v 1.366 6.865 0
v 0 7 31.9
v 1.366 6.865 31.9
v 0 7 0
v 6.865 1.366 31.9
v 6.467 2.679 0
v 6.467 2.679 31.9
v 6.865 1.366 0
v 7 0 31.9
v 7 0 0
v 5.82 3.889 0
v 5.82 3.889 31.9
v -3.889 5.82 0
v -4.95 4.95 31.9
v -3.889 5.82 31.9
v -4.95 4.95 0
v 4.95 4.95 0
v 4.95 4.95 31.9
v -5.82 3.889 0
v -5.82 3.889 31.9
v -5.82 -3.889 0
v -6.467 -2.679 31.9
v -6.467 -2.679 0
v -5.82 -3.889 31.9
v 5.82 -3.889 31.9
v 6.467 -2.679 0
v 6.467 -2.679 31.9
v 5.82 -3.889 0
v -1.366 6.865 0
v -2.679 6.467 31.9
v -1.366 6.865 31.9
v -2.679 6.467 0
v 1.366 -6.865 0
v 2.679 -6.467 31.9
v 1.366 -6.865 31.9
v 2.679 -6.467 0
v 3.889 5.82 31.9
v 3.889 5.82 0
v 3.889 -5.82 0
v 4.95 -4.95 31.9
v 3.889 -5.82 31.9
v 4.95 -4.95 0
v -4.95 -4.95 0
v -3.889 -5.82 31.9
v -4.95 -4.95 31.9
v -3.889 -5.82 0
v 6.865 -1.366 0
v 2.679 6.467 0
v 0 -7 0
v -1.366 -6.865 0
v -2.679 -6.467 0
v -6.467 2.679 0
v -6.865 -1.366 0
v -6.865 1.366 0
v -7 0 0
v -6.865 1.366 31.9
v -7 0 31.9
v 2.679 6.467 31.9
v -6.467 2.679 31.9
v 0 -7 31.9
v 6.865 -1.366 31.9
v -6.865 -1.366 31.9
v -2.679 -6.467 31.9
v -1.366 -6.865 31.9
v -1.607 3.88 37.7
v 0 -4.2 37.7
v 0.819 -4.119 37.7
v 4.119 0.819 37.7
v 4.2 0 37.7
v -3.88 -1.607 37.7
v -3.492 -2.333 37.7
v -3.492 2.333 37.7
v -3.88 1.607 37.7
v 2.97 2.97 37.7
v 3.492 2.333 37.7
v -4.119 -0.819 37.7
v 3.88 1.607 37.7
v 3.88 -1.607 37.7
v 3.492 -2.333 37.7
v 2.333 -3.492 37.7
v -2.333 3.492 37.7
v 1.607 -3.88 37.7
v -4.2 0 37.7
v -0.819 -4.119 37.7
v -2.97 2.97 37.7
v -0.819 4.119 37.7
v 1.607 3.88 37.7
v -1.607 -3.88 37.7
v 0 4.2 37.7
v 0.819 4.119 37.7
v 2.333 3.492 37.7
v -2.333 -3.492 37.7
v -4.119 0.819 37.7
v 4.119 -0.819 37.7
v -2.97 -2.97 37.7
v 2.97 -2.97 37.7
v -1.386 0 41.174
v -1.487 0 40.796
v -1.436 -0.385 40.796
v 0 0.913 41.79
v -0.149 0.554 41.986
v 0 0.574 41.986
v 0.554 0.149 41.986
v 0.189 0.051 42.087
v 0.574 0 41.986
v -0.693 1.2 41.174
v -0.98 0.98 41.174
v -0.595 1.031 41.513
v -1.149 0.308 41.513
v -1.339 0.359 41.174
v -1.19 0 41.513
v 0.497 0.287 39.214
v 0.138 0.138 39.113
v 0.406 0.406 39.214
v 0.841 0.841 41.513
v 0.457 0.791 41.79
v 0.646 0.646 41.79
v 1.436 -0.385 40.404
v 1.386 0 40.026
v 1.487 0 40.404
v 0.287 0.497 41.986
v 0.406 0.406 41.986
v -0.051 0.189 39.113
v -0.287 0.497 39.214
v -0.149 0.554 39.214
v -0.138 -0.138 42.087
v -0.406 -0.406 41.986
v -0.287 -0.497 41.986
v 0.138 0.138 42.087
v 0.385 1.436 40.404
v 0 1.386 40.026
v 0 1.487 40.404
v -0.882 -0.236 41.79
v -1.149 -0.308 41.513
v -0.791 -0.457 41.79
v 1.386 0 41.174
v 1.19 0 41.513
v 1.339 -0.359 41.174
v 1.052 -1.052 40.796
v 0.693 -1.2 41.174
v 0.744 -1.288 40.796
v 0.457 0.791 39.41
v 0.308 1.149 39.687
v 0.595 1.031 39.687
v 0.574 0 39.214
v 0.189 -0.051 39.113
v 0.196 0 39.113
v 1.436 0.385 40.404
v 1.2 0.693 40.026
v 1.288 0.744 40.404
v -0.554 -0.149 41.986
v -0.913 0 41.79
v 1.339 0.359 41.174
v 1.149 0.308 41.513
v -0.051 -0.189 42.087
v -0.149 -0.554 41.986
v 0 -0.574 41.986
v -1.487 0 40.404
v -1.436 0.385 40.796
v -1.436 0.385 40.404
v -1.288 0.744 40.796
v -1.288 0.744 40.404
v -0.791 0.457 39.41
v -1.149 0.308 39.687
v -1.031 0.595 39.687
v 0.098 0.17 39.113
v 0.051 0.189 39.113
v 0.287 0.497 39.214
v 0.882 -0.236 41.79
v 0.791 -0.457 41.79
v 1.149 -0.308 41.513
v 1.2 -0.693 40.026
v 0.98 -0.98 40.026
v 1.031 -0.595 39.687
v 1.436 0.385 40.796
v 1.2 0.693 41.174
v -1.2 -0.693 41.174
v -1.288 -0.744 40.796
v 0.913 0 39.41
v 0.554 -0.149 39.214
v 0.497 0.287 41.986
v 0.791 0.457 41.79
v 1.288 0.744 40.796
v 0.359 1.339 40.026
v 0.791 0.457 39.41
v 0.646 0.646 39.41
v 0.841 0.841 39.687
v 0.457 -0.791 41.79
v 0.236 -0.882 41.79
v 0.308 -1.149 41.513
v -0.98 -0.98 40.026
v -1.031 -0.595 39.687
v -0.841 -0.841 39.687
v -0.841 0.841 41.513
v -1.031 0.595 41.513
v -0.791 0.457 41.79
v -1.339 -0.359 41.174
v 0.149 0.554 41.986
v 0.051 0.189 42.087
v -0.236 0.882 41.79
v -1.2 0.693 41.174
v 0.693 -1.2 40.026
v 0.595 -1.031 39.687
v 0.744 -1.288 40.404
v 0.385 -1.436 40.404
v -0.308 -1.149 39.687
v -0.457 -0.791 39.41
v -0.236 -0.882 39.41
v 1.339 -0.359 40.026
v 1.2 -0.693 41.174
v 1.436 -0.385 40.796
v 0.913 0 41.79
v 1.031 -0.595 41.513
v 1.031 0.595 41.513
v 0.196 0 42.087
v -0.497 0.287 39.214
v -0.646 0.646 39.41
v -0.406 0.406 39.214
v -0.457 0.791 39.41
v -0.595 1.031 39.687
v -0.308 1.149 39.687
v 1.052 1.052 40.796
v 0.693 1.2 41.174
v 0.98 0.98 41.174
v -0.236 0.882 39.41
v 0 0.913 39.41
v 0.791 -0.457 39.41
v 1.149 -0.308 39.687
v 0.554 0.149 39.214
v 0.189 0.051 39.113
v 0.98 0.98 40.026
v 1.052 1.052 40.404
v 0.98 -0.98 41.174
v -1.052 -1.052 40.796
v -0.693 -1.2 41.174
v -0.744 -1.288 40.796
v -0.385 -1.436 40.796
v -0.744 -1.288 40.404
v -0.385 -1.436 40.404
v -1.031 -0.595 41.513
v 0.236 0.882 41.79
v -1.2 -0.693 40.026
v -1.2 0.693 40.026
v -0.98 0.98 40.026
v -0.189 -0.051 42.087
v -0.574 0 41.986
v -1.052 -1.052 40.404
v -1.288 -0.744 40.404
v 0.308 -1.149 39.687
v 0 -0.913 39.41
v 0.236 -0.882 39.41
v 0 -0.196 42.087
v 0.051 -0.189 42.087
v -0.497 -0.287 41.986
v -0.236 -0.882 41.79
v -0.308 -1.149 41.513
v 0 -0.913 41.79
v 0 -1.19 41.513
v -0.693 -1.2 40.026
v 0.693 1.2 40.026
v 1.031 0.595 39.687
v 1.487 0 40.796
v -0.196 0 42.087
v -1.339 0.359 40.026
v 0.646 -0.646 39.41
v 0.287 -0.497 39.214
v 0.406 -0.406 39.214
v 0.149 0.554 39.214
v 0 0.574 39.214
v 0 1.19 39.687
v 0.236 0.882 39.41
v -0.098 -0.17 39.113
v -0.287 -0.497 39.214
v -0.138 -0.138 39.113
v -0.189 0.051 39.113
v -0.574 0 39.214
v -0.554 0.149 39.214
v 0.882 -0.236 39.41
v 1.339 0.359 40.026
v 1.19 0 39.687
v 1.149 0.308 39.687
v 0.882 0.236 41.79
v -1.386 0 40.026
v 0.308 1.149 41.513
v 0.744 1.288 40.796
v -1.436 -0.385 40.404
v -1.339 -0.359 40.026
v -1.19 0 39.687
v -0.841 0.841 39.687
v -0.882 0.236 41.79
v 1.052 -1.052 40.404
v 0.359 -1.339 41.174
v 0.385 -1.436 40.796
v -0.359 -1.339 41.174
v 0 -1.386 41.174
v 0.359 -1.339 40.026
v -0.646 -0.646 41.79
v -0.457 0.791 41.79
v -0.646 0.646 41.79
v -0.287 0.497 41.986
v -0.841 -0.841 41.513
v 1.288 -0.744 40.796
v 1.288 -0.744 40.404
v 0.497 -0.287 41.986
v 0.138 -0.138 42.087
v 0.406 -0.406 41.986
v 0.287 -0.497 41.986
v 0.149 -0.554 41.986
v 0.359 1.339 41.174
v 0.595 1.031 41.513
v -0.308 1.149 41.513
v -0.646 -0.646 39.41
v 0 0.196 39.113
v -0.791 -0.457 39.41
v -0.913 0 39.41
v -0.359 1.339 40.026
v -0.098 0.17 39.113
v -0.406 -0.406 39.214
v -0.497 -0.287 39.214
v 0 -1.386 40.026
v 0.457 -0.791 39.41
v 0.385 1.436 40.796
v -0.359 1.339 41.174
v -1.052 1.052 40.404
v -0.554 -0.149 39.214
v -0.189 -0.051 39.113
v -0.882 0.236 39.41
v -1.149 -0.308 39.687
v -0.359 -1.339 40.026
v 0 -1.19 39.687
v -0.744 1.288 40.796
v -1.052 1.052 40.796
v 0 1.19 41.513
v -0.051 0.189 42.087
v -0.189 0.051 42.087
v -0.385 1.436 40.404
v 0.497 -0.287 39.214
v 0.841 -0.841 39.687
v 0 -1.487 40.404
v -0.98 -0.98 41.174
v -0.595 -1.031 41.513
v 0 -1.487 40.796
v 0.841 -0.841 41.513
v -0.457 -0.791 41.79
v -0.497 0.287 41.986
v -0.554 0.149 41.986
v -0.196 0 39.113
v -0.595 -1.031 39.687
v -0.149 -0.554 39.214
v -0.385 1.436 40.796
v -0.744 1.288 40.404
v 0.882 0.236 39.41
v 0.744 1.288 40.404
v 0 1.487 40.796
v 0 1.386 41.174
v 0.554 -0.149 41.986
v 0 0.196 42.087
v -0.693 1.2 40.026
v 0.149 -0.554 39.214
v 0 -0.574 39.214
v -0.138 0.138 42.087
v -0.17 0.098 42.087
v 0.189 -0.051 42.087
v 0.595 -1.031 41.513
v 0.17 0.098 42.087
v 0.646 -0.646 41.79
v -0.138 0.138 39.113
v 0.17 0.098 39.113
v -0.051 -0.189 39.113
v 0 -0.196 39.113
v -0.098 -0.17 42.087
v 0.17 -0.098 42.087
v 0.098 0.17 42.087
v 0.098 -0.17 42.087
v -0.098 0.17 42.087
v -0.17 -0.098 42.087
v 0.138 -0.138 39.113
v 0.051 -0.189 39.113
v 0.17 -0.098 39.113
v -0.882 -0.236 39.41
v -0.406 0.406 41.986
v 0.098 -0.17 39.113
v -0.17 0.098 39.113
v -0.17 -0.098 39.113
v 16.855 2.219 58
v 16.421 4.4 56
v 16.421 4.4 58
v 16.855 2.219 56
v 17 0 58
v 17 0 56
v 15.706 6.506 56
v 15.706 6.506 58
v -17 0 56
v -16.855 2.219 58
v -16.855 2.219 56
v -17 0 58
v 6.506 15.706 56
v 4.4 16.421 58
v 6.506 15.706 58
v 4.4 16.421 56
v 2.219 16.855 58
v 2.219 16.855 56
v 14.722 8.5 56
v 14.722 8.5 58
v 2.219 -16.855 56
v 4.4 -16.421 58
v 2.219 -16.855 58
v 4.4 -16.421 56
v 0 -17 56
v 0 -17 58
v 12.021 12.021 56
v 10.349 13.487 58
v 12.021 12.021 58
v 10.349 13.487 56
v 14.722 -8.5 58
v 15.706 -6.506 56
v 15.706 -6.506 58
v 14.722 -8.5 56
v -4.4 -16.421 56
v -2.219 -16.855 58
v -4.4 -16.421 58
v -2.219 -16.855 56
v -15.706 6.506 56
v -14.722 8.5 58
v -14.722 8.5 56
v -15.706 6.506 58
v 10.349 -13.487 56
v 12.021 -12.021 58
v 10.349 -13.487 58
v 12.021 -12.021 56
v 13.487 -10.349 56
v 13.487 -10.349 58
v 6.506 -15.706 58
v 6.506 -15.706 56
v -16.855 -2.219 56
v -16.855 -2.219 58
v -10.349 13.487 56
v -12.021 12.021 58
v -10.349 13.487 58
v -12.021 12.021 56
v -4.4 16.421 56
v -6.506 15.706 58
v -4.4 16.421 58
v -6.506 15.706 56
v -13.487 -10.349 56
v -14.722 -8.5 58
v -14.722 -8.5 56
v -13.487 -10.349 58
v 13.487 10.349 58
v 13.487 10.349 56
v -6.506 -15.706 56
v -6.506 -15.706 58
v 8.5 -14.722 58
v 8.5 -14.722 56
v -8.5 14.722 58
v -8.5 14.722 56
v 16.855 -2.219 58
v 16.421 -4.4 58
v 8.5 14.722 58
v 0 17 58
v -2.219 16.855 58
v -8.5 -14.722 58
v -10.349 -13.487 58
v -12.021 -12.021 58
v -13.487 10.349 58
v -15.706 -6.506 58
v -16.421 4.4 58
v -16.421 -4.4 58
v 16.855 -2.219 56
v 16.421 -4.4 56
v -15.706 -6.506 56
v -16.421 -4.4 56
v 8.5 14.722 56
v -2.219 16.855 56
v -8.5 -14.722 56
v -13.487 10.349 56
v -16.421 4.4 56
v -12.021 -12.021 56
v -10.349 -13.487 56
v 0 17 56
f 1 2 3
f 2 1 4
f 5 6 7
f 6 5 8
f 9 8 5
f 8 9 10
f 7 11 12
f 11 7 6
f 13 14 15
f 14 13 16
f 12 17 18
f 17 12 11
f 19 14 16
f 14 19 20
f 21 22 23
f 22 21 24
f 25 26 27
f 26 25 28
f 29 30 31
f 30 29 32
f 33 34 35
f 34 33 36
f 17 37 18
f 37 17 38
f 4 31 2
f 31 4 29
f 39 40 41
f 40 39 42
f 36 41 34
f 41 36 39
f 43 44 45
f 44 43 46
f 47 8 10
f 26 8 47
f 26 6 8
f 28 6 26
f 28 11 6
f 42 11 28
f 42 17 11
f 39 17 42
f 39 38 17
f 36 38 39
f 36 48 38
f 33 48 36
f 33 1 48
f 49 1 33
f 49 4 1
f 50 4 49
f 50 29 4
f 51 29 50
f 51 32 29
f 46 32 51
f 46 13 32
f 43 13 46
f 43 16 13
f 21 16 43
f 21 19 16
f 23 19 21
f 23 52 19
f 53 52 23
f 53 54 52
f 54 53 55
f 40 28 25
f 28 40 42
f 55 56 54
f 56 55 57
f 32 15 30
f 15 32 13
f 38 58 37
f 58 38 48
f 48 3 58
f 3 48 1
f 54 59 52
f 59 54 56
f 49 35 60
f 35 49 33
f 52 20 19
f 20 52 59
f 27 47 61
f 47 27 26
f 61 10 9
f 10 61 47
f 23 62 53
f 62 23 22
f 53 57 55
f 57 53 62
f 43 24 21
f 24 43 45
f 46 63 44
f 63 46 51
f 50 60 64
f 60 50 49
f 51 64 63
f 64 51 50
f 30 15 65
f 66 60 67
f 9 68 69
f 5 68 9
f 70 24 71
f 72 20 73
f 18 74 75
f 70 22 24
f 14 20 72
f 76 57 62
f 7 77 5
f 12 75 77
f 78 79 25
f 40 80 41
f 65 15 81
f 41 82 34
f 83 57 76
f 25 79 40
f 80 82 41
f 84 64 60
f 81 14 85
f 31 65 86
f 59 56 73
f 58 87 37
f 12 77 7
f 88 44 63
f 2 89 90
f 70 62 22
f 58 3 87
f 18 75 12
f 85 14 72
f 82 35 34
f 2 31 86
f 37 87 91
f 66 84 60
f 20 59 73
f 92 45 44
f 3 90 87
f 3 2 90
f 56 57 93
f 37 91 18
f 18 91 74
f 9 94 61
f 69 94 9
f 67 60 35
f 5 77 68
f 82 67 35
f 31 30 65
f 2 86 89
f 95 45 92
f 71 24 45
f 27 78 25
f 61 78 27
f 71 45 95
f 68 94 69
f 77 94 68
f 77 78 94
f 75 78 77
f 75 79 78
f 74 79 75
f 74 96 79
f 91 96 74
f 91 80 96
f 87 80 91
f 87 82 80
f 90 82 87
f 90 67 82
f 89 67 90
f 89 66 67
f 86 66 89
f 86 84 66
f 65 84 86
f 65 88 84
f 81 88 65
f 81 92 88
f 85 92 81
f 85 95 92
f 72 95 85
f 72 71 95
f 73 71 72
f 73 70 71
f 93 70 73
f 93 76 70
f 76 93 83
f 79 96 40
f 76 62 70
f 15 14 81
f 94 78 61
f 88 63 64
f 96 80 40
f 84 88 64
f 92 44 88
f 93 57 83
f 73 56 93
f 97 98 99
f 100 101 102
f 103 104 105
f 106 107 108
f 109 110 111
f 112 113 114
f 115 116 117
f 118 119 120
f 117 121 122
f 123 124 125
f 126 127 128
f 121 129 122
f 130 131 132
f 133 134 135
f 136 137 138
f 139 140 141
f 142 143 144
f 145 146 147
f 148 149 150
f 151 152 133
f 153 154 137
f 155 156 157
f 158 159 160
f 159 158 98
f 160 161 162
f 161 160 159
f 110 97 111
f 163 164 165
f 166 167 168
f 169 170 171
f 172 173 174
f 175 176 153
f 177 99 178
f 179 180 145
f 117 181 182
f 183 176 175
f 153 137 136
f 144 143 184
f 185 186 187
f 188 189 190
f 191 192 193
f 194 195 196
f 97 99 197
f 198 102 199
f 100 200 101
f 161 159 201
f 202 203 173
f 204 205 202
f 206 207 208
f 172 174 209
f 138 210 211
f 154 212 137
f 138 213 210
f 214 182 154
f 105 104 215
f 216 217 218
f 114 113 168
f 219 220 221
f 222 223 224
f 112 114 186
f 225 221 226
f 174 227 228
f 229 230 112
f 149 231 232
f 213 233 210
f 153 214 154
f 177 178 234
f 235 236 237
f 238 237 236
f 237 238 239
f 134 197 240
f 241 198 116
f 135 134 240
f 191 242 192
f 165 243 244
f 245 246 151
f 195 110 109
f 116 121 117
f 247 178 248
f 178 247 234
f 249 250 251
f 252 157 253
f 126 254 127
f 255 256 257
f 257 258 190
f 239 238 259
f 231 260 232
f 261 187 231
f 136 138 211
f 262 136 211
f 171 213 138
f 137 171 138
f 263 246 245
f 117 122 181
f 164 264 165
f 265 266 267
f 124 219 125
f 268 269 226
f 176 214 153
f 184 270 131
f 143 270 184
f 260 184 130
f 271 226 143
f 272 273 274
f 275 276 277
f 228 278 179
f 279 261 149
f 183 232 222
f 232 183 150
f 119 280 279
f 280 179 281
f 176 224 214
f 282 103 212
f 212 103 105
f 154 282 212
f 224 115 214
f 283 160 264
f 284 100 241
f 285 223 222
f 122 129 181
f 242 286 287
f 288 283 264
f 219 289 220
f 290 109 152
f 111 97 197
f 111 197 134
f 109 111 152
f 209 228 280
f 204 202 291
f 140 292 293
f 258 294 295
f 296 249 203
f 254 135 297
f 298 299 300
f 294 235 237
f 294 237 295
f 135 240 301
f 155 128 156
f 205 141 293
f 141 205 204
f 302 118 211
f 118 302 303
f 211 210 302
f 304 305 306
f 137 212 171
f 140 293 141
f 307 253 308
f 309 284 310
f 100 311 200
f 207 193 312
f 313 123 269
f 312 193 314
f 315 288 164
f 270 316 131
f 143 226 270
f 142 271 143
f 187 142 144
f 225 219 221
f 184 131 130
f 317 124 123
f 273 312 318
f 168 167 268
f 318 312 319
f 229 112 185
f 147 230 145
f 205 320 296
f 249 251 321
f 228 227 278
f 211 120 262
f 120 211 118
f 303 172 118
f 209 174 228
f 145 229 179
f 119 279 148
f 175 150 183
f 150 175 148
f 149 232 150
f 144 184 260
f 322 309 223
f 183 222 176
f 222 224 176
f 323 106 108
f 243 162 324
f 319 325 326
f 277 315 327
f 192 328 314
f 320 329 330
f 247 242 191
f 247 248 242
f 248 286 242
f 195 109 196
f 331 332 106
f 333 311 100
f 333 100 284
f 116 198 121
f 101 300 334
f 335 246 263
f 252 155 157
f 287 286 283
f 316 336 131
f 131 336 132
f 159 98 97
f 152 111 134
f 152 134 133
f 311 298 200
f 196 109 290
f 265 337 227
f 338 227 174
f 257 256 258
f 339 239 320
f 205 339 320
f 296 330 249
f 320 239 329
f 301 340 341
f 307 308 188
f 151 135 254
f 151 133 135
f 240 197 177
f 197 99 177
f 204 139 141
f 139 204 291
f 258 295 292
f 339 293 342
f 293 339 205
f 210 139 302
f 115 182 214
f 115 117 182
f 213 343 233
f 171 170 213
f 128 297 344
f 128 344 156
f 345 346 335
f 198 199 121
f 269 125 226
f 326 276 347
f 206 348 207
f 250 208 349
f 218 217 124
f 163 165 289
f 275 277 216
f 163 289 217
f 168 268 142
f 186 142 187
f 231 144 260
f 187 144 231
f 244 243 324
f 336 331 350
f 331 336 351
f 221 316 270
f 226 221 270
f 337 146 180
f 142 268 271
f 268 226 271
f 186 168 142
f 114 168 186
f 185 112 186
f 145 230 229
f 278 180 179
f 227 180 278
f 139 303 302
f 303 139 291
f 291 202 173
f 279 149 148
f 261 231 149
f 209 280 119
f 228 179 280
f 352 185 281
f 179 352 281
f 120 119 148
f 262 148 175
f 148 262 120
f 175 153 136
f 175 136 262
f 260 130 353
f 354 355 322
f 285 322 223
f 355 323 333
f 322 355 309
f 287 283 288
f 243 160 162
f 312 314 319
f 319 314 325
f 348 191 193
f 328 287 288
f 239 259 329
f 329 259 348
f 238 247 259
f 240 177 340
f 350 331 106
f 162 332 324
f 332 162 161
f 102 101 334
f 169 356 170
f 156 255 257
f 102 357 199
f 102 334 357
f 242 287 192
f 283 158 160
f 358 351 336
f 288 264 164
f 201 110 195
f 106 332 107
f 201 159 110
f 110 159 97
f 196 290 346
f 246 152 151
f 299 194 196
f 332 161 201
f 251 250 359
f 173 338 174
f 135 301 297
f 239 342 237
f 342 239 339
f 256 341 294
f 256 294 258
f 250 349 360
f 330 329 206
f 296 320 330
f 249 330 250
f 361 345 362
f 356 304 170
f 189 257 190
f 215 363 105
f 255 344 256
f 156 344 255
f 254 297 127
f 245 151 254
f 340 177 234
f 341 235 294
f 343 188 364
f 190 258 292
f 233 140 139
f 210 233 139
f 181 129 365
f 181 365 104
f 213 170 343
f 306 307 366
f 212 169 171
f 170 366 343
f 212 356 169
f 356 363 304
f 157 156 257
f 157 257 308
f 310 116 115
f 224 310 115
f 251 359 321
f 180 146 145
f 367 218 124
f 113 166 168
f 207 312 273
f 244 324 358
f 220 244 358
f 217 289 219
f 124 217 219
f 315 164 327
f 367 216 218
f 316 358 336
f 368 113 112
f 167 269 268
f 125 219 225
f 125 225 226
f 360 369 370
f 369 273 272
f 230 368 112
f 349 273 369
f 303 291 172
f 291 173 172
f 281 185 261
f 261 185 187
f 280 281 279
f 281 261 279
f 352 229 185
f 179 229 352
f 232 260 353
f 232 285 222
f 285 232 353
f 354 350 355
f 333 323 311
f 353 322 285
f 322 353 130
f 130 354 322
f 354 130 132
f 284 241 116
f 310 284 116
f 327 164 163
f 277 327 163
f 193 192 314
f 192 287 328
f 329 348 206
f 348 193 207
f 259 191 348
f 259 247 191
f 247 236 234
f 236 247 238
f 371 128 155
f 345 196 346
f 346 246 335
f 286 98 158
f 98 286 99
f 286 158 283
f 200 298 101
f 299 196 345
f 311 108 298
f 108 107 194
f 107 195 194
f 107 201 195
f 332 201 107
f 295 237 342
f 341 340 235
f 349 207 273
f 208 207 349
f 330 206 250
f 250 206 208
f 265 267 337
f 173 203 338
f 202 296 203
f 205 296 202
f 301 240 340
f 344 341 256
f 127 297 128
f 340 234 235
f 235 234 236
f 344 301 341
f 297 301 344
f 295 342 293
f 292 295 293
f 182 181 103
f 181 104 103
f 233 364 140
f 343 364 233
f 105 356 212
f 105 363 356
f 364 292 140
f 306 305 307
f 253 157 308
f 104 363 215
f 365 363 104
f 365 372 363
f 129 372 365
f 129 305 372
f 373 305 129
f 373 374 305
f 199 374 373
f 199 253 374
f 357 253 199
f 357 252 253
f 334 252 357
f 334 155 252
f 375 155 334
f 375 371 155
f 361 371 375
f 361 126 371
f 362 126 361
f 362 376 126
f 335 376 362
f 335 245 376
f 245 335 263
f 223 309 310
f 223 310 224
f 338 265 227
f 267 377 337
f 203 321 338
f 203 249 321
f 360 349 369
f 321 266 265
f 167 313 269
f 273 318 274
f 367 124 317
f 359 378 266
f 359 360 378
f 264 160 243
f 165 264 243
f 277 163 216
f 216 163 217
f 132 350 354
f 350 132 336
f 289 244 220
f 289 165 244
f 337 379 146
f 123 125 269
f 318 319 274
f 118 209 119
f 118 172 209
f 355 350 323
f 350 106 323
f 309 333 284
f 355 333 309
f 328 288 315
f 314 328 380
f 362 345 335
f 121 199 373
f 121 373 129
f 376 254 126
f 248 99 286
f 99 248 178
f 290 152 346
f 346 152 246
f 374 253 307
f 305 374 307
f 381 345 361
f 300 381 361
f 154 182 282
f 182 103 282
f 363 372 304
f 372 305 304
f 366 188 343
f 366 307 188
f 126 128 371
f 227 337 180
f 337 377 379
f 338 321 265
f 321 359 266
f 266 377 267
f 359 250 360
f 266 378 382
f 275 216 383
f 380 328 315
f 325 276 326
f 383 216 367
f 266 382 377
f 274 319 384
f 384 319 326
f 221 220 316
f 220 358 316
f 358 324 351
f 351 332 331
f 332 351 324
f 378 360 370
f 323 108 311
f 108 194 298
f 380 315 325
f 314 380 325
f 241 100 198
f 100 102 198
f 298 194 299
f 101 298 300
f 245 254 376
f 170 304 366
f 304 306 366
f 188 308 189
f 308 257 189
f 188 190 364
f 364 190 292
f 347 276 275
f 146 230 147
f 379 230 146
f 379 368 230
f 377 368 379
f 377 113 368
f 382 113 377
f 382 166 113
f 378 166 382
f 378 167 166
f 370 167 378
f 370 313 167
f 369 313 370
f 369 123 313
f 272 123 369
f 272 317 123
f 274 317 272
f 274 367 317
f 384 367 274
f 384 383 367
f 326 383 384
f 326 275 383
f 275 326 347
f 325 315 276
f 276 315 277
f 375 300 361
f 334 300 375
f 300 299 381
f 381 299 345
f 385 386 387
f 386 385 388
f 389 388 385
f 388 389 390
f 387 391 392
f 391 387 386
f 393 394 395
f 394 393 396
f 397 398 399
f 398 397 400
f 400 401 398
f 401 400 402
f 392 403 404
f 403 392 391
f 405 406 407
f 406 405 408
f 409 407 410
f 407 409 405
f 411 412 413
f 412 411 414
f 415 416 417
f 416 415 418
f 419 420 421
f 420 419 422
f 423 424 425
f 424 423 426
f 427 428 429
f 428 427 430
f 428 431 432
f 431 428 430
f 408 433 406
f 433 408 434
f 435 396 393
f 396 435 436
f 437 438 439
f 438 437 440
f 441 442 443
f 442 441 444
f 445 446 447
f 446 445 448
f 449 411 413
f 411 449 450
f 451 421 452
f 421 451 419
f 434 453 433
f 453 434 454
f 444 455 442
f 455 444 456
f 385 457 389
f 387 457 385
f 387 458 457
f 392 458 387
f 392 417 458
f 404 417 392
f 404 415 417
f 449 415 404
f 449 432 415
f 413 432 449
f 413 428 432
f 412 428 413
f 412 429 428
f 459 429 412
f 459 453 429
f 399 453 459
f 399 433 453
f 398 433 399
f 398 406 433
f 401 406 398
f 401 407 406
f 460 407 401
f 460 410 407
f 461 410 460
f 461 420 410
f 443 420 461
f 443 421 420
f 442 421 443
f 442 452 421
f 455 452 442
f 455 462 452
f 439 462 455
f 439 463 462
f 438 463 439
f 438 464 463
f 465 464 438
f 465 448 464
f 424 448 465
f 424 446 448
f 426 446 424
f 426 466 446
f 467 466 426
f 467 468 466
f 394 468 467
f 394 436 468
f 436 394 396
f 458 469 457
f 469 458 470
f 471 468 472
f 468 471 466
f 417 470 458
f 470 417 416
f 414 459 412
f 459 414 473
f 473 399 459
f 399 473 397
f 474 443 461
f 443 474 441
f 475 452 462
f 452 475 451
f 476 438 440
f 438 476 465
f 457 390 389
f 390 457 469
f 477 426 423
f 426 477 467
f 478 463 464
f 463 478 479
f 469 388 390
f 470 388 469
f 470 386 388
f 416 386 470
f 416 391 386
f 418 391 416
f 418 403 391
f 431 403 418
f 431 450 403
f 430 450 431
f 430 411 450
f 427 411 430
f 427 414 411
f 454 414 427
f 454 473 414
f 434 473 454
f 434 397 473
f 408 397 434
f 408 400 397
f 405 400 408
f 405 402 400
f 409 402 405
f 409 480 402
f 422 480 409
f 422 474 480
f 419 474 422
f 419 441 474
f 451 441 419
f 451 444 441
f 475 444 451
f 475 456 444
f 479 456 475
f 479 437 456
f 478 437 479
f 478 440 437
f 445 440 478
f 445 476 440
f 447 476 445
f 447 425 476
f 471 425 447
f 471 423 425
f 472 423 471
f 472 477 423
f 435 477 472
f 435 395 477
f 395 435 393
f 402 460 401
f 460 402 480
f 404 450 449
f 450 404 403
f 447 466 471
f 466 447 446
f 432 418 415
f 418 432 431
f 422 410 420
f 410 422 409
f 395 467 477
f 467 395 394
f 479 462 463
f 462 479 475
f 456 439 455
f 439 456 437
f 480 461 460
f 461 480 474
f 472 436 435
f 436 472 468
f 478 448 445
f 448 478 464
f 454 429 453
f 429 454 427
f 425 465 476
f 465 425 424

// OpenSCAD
// Quick-response pendant, K=8.0 (≈ Tyco TY-B).
// Y-up in consumer; authored Z-up here, converted at render.
k = 8.0;
frame_d = 14;          // 1/2" NPT body
bulb_d = 3;
deflector_d = 34;
total_h = 58;
union() {
    cylinder(h = total_h * 0.55, d = frame_d, $fn = 32);
    translate([0, 0, total_h * 0.55])
        cylinder(h = total_h * 0.10, d1 = frame_d, d2 = frame_d * 0.6, $fn = 32);
    translate([0, 0, total_h * 0.70])
        sphere(d = bulb_d, $fn = 24);
    translate([0, 0, total_h - 2])
        cylinder(h = 2, d = deflector_d, $fn = 48);
}
